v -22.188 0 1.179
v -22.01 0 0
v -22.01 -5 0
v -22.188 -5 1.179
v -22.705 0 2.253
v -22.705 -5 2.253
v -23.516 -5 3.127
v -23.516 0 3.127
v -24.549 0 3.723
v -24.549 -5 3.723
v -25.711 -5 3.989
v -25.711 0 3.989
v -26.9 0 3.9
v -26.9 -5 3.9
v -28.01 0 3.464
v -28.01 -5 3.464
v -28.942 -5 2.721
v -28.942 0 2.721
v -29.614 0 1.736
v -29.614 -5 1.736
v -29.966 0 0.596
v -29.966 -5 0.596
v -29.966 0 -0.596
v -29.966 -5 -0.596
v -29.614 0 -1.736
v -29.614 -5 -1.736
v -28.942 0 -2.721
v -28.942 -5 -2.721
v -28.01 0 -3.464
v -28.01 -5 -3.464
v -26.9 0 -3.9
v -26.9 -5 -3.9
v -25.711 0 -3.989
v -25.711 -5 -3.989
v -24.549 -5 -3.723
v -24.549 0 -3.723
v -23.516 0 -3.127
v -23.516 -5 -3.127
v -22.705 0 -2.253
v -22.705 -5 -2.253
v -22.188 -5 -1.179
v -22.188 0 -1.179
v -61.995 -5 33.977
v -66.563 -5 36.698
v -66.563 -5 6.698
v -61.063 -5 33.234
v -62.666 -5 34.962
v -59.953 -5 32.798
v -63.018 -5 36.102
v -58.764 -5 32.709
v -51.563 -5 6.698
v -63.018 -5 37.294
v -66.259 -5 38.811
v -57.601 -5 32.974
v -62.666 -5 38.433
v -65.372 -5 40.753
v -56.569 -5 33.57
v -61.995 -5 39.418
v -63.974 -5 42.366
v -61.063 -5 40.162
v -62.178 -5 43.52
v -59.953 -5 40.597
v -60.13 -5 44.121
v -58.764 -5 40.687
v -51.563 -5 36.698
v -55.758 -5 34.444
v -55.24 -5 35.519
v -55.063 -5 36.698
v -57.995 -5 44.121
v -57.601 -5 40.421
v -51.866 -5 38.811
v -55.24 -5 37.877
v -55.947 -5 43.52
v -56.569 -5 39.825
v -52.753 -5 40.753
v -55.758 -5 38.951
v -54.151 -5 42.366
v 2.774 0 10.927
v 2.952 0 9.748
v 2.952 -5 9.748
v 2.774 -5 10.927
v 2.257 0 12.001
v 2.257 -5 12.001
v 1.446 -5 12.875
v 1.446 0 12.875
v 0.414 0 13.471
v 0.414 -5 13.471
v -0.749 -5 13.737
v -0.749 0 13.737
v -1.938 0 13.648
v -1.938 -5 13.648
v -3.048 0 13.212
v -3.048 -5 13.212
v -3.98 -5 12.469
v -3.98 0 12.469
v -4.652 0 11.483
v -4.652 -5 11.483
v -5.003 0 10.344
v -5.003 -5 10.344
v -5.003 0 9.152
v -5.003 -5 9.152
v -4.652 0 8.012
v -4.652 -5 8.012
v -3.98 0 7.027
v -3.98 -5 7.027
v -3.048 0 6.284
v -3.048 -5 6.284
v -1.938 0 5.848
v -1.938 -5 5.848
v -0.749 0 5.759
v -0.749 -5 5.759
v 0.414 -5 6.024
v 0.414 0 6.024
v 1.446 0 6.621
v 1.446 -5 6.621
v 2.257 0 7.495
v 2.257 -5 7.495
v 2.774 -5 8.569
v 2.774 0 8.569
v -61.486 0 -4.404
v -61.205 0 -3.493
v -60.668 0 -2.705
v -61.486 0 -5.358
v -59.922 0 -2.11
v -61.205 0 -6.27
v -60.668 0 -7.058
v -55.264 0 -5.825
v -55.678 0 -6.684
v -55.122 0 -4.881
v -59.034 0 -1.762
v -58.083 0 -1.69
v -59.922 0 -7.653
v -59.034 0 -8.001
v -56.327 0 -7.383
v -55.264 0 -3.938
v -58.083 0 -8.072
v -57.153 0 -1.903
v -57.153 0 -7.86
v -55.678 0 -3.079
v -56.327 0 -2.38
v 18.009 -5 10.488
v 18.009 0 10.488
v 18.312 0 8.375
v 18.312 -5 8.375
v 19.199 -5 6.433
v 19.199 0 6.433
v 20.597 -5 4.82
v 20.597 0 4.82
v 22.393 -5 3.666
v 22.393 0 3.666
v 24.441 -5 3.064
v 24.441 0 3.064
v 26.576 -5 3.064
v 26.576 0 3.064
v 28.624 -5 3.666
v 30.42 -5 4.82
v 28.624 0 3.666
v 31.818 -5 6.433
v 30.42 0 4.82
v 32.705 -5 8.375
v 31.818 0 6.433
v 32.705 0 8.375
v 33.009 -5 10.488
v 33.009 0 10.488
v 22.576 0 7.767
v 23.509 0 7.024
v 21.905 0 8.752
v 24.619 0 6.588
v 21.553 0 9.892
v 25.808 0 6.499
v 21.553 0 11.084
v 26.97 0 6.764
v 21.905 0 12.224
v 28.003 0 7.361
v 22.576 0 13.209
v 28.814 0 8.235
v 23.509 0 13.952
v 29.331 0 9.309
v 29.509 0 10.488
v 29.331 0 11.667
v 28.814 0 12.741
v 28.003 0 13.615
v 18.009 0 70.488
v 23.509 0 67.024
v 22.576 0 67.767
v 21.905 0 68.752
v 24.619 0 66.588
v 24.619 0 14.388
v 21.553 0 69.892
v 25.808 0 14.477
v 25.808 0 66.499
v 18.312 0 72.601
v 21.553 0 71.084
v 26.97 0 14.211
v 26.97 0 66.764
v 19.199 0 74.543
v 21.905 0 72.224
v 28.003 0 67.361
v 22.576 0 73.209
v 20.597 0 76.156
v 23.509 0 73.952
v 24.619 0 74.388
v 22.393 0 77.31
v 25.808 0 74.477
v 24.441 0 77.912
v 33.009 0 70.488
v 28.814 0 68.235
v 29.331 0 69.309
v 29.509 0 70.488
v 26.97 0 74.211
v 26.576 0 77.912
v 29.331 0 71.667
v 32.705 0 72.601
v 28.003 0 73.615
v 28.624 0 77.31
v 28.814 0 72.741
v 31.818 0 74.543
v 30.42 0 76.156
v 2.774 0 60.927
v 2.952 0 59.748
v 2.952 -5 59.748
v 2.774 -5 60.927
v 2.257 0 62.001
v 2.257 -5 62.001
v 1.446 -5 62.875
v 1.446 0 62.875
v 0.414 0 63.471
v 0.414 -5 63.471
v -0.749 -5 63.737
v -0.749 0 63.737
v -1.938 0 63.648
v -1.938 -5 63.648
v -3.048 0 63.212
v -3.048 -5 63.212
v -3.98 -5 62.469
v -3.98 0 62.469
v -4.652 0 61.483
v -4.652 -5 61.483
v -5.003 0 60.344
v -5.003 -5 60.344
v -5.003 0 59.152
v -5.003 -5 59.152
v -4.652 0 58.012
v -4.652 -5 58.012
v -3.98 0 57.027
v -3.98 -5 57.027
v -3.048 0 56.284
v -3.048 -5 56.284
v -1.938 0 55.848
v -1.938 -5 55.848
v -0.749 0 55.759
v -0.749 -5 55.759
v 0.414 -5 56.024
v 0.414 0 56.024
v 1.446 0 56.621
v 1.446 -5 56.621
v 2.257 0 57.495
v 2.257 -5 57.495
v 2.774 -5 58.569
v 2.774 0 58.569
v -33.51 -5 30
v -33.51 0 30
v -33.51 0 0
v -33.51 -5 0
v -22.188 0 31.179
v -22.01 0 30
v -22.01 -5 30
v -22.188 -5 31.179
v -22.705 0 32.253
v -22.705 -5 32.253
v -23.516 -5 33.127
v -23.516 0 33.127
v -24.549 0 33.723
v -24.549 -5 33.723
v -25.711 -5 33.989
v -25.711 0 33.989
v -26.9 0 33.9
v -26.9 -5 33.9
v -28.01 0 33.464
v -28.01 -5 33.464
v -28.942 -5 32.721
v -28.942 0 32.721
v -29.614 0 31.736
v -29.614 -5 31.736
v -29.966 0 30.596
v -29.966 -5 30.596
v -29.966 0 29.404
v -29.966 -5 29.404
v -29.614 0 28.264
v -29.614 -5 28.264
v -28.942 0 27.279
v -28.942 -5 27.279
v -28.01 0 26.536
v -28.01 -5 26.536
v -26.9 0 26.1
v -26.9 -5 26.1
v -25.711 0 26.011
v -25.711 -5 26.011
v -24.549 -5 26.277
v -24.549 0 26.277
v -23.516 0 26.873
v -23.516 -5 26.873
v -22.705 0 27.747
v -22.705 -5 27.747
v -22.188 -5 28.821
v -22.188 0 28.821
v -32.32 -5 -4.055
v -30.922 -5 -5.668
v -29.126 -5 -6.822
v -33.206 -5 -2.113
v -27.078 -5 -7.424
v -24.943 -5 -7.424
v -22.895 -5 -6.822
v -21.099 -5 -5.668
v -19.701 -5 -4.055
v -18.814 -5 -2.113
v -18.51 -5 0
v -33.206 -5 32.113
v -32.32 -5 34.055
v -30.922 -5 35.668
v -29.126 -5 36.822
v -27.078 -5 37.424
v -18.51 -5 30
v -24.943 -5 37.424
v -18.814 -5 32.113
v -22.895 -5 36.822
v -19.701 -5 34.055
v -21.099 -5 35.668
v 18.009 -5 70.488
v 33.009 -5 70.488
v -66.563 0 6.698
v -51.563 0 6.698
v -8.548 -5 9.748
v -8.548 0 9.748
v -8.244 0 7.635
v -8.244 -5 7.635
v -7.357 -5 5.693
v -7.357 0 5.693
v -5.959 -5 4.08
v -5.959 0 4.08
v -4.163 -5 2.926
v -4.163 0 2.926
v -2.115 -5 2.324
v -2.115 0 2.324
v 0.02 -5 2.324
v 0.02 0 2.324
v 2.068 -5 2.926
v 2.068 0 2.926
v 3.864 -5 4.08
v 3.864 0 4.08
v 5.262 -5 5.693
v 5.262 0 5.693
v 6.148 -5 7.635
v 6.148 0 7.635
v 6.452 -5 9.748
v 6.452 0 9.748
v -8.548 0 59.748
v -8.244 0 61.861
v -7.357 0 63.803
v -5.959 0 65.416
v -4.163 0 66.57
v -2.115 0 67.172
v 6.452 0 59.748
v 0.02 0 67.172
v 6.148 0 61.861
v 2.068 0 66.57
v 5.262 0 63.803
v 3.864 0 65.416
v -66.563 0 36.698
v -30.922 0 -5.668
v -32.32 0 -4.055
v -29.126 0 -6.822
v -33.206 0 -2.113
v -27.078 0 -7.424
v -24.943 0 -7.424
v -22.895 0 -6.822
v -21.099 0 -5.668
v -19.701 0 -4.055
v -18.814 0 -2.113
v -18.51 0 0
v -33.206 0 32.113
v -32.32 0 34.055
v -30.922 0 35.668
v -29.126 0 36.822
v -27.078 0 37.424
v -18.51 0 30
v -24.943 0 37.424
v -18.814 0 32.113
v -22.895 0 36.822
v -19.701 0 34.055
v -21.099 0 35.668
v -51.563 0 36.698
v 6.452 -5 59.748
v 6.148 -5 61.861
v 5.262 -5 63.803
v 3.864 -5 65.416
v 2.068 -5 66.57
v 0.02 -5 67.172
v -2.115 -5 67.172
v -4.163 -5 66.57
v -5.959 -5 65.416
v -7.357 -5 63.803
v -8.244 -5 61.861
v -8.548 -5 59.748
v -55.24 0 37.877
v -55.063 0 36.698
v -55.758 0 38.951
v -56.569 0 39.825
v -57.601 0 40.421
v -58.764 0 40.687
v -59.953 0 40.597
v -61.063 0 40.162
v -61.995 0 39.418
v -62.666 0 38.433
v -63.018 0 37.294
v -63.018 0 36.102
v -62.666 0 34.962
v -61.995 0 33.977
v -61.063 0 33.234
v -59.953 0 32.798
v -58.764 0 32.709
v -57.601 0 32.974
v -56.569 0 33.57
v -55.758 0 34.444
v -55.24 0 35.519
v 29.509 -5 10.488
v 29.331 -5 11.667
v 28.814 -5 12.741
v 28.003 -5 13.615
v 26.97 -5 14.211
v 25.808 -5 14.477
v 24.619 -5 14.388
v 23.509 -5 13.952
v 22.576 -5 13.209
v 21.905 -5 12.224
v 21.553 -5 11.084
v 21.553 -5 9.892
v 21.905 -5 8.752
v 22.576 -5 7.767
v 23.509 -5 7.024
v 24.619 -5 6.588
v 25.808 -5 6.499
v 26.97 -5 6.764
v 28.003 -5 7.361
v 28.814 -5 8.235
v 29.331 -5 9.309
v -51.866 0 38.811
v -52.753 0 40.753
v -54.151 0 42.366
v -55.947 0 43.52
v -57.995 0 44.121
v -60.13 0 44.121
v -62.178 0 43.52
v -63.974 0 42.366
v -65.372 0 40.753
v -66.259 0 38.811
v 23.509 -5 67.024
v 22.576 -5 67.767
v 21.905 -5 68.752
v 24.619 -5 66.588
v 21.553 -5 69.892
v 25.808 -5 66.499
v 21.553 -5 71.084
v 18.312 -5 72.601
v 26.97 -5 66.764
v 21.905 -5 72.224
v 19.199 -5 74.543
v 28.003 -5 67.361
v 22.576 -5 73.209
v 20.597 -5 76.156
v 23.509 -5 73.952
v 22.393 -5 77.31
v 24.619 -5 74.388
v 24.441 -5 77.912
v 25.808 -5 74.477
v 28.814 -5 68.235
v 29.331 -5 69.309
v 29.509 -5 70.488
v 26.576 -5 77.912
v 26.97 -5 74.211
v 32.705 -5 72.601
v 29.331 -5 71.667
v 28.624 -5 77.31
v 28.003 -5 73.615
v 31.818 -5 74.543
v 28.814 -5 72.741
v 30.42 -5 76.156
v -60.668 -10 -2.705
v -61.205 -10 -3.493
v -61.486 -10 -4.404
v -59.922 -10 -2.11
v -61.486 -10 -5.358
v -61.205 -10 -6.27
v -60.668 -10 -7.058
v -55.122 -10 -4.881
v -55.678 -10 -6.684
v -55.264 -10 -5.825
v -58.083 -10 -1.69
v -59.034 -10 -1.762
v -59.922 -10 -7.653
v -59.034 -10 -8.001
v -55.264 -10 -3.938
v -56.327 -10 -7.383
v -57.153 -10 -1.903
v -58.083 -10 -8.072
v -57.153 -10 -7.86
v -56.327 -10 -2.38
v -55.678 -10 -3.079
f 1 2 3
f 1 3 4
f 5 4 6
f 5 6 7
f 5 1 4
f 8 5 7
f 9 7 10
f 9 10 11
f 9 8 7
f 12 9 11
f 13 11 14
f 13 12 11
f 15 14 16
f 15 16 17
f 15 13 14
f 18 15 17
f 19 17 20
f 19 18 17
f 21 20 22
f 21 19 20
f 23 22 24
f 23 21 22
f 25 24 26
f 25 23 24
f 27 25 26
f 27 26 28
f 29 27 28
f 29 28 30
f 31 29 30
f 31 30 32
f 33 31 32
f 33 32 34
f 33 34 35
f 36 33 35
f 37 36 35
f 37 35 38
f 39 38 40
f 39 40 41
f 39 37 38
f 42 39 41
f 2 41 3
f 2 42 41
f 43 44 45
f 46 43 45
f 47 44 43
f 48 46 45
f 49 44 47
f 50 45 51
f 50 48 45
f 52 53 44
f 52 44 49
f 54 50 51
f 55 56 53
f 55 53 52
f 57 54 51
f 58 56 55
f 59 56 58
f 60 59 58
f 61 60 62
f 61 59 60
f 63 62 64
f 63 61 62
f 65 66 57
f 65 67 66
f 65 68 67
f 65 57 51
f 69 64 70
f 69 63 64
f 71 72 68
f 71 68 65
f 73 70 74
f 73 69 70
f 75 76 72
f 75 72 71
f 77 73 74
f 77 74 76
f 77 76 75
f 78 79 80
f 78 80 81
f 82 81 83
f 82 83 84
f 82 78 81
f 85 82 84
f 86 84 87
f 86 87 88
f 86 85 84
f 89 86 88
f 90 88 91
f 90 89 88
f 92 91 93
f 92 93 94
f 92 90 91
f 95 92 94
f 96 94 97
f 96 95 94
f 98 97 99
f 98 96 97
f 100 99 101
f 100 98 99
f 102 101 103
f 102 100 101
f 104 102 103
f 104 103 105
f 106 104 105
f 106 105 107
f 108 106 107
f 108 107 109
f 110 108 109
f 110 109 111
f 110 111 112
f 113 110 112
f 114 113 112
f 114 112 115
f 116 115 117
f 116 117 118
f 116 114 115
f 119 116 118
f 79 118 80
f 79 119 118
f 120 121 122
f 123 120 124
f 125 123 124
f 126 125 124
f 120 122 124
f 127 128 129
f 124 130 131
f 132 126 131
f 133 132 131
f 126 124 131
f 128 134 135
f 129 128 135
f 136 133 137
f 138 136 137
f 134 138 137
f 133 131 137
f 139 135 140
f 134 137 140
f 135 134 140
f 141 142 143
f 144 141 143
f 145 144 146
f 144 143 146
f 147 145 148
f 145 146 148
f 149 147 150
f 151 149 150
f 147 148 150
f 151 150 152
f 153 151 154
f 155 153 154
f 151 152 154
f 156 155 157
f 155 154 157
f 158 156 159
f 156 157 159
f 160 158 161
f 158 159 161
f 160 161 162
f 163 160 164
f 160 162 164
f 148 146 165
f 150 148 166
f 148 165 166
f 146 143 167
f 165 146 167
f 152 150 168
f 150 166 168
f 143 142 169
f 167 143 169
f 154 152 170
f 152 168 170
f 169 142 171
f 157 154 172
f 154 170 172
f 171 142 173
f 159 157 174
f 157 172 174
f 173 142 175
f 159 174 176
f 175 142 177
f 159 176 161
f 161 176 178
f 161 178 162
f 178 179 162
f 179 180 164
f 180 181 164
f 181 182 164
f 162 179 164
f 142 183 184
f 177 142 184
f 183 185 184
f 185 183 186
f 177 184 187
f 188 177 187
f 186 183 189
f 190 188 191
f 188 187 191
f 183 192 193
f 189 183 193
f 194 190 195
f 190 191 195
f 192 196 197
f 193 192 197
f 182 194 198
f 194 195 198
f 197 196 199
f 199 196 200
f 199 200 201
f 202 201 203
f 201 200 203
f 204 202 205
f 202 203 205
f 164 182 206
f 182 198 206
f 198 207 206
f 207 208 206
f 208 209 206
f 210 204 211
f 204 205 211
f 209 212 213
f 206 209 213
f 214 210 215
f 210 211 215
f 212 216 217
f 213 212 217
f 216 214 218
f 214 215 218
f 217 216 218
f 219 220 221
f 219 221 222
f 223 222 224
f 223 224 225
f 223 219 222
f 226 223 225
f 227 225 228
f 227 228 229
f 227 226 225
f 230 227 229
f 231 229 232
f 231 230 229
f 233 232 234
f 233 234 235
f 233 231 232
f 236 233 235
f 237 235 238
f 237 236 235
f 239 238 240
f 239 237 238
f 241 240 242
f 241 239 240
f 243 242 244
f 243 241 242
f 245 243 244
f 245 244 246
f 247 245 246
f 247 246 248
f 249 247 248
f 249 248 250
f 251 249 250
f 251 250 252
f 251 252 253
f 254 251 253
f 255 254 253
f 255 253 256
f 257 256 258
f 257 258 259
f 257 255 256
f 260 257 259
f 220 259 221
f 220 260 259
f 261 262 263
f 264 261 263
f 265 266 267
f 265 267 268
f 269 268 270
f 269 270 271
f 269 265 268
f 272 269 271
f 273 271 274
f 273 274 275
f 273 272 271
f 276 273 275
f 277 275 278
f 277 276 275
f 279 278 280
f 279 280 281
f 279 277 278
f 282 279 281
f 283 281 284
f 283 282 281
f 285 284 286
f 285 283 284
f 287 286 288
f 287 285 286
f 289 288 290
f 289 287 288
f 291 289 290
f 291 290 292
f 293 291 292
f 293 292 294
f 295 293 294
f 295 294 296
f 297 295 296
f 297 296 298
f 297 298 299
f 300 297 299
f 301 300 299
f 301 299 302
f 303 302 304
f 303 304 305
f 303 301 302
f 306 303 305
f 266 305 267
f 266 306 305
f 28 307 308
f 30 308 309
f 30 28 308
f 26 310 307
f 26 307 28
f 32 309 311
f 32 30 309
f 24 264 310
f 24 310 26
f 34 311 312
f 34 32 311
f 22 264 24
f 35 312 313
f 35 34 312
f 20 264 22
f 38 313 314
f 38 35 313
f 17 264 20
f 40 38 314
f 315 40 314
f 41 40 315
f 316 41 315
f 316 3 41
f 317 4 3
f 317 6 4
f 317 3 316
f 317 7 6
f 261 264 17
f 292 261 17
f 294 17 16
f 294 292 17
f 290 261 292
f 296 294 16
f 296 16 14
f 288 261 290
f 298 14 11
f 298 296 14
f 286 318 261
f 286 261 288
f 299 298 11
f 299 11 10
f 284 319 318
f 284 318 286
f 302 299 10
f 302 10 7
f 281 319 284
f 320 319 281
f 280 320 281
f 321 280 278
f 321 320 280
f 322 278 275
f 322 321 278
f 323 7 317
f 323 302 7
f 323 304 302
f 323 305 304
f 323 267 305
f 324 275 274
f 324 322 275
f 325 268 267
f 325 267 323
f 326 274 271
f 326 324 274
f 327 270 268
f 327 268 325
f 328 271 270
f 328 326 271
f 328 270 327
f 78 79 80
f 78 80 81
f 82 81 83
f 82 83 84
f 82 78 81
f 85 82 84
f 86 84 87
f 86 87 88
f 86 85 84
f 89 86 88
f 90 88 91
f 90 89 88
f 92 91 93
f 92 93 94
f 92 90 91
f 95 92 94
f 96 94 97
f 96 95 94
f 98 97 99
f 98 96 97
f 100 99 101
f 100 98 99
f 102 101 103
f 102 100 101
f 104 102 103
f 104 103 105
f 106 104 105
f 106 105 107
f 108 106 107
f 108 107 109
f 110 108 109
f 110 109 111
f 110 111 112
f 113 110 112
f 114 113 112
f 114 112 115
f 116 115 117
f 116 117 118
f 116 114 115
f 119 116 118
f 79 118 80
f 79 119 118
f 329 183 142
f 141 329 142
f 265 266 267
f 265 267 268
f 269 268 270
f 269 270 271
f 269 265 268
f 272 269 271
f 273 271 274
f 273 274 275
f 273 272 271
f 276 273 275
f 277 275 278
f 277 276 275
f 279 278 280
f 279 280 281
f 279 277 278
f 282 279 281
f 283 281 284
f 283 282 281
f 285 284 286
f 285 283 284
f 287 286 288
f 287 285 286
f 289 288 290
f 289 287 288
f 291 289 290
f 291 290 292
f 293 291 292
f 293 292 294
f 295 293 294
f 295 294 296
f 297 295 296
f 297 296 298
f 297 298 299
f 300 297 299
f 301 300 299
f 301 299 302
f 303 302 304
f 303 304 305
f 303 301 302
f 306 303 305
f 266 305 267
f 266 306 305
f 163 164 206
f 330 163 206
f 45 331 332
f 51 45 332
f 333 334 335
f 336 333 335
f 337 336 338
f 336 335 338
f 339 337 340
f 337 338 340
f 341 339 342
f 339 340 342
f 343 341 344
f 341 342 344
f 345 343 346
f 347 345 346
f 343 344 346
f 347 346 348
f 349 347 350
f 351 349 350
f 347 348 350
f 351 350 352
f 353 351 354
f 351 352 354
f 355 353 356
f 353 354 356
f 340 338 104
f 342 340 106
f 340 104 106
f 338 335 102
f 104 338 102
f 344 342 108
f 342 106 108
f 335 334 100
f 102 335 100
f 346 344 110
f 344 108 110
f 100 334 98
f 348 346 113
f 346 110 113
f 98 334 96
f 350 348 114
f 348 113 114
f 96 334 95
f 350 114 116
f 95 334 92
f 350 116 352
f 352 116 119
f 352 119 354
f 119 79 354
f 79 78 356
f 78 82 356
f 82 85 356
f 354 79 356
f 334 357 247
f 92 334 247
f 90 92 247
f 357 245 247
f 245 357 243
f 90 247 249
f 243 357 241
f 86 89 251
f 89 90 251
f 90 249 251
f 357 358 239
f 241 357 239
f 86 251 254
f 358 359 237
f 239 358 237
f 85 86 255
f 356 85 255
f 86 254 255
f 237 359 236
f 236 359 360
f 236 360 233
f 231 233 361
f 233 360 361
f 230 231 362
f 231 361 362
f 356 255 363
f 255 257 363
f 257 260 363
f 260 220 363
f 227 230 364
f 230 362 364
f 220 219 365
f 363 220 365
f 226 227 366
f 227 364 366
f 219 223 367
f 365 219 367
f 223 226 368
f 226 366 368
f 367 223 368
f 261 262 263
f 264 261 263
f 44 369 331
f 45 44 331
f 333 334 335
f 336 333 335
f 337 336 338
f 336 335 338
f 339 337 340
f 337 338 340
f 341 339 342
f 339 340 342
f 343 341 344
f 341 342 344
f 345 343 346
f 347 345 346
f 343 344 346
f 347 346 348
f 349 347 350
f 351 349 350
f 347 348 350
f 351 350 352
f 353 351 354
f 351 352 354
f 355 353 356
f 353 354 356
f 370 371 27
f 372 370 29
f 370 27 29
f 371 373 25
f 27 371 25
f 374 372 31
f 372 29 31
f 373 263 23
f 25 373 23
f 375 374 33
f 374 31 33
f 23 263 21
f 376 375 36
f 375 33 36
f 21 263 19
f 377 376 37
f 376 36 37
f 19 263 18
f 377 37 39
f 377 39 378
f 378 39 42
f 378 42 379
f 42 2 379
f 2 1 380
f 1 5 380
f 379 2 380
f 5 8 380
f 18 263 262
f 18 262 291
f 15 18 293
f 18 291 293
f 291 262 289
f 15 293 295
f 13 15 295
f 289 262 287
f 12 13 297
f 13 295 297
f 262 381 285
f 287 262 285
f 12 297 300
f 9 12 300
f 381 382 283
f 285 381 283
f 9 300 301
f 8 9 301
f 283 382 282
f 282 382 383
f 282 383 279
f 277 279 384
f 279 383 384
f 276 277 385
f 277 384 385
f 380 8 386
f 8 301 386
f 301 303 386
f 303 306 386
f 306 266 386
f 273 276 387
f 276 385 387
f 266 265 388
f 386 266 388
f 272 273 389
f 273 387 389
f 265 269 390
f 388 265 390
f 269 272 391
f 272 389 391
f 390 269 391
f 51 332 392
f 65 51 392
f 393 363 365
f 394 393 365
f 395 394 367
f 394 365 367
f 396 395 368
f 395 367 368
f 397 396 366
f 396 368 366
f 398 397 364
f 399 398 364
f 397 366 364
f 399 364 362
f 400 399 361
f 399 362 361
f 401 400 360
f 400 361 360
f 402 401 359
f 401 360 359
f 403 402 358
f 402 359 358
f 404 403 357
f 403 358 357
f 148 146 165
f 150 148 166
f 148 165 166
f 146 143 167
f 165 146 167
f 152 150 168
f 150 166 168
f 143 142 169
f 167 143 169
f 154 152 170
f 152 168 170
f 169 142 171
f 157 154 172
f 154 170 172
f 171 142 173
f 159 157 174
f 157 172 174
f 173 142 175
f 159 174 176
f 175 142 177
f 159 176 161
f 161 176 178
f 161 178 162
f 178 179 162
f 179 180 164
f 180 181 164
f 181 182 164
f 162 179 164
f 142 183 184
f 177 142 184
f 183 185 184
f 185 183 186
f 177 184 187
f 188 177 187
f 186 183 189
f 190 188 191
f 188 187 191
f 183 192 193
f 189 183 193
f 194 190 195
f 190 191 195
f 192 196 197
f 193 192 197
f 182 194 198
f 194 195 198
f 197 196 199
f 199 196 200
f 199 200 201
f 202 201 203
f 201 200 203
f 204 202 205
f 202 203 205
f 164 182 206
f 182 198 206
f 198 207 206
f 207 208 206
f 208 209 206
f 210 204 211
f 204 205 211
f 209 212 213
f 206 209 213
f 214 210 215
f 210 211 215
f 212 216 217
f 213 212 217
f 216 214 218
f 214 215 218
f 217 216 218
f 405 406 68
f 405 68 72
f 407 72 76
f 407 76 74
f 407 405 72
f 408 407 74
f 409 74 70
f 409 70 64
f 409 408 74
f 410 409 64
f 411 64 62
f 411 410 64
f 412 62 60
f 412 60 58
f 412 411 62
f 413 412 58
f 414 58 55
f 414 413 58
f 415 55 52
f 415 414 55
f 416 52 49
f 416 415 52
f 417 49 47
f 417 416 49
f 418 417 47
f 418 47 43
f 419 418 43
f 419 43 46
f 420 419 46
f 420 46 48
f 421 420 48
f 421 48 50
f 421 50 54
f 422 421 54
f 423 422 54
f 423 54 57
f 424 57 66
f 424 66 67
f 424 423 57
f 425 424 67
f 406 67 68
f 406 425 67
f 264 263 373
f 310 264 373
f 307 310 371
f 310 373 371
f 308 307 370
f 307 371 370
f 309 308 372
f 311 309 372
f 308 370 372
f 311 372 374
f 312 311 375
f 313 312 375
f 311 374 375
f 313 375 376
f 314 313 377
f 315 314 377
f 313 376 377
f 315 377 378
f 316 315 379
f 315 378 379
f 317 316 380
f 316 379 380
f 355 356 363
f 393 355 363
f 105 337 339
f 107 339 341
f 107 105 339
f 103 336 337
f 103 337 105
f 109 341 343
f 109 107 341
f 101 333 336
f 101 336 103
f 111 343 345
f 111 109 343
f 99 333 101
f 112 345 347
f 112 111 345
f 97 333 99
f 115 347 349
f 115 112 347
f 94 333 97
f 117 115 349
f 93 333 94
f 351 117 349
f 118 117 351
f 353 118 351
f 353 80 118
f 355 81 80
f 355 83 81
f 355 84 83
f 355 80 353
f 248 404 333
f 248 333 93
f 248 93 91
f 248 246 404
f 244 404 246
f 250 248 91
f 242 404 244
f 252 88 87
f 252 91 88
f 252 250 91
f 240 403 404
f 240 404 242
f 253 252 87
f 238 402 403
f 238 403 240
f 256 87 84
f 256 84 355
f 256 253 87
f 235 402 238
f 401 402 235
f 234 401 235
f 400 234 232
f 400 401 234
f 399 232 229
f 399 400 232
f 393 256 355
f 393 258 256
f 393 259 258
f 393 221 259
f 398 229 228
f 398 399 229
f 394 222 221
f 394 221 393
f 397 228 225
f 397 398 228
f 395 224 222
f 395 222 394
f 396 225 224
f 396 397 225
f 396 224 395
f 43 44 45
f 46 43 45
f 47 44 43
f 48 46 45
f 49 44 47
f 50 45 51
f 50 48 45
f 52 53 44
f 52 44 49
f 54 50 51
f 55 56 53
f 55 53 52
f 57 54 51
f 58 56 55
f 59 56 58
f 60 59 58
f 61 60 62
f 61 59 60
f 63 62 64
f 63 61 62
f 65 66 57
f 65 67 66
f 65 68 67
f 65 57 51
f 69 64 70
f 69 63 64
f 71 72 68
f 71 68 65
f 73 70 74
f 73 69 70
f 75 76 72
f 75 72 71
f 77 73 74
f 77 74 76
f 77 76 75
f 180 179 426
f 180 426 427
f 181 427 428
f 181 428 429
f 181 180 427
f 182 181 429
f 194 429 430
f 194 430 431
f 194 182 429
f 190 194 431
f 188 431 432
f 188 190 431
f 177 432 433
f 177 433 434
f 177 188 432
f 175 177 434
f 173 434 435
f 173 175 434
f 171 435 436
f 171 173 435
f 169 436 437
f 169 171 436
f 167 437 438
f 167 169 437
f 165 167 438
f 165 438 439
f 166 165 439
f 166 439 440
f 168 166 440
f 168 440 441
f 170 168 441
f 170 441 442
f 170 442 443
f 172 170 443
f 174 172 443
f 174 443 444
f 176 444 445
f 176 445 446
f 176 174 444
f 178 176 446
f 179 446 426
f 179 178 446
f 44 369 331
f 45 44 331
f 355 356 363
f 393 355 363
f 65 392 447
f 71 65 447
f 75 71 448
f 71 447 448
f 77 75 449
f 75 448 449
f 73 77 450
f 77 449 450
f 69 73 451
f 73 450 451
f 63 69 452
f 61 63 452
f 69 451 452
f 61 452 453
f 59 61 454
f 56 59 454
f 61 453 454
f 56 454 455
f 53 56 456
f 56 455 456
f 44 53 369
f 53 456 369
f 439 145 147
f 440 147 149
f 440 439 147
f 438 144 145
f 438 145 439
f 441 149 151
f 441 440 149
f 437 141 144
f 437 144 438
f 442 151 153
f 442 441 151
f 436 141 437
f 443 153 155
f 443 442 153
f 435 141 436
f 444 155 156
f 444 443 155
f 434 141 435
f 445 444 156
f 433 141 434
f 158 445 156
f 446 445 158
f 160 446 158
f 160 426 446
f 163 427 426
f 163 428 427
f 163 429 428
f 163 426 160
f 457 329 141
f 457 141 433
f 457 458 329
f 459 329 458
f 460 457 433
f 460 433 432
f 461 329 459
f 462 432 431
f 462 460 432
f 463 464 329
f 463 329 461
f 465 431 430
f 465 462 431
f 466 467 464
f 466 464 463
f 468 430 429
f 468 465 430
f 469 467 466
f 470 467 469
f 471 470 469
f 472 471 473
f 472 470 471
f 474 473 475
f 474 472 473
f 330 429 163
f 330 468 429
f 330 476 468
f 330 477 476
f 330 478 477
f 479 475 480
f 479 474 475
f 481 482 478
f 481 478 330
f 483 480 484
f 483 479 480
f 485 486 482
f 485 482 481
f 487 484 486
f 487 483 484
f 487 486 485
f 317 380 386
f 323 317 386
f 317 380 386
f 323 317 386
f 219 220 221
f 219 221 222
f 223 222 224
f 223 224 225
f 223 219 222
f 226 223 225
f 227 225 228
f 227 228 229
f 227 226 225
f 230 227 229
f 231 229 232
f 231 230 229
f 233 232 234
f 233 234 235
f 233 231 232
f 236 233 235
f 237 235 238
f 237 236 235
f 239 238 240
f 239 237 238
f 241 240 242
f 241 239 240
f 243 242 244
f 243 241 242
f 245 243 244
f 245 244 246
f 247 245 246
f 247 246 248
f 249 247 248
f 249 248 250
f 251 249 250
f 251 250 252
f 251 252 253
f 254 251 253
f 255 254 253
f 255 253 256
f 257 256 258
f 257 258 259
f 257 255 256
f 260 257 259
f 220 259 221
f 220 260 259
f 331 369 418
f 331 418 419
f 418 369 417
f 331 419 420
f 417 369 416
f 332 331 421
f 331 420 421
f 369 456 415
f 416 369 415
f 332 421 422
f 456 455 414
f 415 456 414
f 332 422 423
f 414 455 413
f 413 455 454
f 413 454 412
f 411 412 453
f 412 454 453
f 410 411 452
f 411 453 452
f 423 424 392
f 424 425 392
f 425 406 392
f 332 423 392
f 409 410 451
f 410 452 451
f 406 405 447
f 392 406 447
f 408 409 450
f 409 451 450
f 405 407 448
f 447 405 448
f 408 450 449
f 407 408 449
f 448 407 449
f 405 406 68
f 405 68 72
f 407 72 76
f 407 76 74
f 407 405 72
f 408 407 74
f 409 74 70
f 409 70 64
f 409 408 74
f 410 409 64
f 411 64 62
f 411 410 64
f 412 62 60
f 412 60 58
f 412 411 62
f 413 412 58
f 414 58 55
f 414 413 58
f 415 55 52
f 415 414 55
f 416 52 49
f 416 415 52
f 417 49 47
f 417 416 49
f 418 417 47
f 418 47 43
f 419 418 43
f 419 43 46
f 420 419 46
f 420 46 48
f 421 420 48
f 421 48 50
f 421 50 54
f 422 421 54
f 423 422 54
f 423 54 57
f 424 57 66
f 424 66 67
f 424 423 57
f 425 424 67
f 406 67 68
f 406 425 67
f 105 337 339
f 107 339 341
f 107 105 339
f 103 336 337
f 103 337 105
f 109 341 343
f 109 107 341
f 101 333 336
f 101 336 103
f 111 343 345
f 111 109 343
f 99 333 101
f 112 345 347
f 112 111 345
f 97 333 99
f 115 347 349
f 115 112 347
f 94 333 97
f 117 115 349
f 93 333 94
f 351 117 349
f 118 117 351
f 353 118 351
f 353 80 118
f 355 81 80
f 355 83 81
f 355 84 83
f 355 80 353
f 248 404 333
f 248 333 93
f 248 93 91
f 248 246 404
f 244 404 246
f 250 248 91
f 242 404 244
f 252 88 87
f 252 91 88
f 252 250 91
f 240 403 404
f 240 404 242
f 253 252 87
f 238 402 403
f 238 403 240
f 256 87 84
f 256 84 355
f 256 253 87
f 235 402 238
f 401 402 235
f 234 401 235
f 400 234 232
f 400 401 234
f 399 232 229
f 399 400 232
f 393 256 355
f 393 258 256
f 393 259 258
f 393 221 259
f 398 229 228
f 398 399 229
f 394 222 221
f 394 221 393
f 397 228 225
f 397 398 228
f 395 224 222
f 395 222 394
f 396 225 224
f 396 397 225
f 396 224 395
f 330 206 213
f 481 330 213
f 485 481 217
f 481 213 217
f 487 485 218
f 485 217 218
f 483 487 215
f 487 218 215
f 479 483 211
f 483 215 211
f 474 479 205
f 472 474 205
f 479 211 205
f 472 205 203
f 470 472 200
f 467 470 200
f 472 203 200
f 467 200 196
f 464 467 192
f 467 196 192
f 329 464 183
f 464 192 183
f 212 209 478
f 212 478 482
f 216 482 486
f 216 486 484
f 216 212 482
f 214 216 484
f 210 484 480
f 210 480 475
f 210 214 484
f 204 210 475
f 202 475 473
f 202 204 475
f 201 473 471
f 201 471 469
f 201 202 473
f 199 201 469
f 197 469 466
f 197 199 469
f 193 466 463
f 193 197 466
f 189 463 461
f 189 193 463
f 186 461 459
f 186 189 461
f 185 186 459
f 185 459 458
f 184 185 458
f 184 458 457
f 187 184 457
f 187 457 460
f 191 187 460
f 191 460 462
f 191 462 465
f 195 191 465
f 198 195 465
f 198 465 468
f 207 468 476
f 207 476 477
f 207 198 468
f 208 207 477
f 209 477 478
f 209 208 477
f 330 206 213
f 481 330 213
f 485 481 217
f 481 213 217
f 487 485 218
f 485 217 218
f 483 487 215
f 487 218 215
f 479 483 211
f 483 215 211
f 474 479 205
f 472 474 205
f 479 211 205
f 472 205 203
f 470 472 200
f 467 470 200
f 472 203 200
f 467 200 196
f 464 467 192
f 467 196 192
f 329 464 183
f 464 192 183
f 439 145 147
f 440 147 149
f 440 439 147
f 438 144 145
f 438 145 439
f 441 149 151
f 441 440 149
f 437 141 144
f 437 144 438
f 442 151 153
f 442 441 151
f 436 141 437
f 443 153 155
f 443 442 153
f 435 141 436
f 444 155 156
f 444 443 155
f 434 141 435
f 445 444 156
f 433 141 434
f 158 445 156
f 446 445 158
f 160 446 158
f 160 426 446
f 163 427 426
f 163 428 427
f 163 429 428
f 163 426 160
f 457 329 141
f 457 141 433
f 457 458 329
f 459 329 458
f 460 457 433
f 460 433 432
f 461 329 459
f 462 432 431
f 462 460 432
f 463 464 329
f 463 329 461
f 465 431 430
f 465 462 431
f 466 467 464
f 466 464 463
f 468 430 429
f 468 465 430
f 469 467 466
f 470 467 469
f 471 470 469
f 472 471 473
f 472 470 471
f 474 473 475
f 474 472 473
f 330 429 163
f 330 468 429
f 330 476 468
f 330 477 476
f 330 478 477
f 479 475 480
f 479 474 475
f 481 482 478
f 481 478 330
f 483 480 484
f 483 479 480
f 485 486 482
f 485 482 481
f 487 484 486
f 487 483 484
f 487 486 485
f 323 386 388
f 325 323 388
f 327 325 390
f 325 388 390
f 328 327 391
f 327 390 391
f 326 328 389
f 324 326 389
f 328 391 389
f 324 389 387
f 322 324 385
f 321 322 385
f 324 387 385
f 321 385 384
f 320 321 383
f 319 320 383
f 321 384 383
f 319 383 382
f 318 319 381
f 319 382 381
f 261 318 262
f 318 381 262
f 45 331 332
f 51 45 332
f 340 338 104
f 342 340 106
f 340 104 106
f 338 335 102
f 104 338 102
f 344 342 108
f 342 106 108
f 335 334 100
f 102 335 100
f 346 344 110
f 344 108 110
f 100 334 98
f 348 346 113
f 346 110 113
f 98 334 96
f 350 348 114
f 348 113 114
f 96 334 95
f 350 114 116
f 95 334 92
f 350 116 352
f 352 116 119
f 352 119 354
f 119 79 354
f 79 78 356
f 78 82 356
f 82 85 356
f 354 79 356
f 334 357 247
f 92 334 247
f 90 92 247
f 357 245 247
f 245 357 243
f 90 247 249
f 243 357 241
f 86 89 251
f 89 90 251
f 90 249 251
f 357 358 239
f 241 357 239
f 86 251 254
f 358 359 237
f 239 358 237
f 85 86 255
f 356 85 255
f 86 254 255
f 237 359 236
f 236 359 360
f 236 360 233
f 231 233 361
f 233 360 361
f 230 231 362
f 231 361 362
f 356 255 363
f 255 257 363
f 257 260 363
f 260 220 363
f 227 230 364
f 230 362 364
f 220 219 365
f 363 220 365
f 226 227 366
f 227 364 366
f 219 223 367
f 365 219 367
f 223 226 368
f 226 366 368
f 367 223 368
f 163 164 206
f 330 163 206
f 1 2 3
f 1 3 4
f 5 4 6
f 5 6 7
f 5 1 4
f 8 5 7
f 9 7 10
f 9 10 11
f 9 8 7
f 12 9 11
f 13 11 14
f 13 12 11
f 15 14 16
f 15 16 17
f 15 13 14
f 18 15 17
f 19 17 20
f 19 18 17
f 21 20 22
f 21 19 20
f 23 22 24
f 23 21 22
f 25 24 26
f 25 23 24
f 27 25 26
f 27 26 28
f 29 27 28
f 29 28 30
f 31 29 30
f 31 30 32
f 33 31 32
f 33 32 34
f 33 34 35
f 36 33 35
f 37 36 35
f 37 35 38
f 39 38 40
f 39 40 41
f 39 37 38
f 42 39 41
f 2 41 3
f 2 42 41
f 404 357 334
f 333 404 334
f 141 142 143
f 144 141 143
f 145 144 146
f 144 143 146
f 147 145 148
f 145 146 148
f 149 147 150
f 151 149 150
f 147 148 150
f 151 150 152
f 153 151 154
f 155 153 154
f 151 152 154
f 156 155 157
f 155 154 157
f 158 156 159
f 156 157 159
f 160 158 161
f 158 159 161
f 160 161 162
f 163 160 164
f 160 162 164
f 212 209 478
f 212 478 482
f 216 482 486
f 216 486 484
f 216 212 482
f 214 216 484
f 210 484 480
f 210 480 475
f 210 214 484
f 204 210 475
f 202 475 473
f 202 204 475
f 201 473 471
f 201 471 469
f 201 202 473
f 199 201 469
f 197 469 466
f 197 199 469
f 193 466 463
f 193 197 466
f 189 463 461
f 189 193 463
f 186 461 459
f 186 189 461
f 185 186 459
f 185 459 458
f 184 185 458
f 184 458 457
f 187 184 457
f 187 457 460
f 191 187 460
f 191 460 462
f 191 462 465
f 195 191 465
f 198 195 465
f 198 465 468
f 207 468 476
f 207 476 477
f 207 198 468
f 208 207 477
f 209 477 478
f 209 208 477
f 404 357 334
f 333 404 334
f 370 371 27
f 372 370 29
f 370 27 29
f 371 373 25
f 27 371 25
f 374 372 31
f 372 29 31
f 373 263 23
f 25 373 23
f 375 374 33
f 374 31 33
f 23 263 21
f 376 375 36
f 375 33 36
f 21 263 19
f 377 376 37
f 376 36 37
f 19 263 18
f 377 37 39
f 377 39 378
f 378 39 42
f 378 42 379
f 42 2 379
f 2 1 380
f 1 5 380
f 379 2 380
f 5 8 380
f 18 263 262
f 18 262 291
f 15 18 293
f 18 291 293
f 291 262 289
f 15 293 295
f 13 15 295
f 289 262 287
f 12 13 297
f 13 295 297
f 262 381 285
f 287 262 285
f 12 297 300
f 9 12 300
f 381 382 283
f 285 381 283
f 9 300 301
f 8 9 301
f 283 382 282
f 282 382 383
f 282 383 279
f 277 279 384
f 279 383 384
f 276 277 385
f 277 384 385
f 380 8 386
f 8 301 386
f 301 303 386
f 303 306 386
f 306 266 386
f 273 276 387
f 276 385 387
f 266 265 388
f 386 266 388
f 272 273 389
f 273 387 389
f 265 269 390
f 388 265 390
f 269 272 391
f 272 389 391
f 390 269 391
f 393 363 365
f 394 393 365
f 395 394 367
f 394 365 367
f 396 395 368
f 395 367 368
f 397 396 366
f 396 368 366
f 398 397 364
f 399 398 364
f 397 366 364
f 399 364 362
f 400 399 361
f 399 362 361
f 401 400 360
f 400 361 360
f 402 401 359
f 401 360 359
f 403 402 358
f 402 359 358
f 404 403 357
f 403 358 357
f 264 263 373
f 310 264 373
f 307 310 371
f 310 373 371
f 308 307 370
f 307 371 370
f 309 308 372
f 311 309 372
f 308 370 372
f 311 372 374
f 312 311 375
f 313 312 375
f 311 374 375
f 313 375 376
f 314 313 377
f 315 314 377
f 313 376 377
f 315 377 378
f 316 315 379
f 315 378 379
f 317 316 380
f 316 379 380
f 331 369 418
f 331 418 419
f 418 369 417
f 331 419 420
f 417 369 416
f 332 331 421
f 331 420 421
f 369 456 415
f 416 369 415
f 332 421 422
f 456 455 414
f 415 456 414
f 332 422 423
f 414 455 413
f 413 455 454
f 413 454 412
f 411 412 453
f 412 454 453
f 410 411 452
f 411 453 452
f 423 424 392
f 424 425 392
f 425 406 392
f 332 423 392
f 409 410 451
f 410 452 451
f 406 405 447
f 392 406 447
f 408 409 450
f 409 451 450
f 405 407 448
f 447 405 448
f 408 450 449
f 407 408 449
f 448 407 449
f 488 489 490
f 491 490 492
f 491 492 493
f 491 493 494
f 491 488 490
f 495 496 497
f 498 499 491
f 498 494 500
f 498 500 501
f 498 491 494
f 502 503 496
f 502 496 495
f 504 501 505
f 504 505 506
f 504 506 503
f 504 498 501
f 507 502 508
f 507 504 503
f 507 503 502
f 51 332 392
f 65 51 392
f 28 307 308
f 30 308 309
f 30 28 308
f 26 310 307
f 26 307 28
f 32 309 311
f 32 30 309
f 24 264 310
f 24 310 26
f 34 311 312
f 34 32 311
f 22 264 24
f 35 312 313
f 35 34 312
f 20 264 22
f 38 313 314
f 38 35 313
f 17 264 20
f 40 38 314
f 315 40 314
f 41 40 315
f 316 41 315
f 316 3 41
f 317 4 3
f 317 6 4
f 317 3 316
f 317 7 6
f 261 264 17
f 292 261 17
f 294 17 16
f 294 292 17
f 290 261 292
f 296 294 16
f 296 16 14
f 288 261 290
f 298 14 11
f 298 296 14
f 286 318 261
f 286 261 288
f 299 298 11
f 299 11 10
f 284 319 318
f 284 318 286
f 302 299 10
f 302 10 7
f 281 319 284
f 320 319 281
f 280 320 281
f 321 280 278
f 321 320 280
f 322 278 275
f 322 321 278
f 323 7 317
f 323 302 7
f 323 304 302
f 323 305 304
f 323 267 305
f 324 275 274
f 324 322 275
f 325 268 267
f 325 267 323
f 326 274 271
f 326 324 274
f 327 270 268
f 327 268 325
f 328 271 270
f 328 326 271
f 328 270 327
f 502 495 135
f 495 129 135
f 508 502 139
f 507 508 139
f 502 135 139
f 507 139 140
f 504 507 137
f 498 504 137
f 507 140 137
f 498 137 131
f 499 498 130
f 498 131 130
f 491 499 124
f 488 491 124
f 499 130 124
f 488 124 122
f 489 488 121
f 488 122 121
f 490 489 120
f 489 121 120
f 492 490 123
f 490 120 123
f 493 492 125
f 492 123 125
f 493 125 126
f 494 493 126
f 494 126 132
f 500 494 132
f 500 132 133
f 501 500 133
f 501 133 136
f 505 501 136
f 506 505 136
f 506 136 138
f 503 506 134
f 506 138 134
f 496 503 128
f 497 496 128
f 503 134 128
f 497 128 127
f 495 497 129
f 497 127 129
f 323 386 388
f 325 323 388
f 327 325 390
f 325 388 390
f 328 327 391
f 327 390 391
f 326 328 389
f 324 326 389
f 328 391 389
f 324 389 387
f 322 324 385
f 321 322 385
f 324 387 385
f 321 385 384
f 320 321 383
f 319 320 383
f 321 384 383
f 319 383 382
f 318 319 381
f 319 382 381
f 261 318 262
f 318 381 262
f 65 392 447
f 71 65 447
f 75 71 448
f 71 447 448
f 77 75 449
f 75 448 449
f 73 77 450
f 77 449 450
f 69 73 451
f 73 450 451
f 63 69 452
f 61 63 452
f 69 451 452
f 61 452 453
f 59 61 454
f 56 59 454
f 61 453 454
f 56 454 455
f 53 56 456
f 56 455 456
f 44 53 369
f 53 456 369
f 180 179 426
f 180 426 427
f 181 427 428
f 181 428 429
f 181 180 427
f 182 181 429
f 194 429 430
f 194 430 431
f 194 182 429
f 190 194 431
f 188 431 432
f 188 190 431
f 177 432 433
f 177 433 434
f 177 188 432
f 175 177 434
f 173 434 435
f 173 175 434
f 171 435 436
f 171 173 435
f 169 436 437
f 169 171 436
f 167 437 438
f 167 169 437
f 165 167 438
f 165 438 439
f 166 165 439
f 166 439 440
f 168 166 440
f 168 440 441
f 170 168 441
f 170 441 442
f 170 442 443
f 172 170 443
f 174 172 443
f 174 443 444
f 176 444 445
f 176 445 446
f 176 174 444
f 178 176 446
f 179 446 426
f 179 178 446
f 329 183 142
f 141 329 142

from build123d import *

# Parameters (mm, degrees)
F0_R      = 4
F1_DEPTH  = 5
F0_R_2    = 3.2
F2_DEPTH  = 5
F2_FACE_R = 3.2
F3_DEPTH  = 5


with BuildPart() as f1:
    # F0 (on Front) → F1 (new body)
    with BuildSketch(Plane.XZ):
        with BuildLine():
            ThreePointArc((-51.562501, 36.697761), (-59.062501, 44.197761), (-66.562501, 36.697761))
            Line((-66.562501, 36.697761), (-66.562501, 6.697761))
            Line((-66.562501, 6.697761), (-51.562501, 6.697761))
            Line((-51.562501, 6.697761), (-51.562501, 36.697761))
        make_face()
        with Locations((-59.062501, 36.697761)):
            Circle(F0_R, mode=Mode.SUBTRACT)
        with BuildLine():
            ThreePointArc((-18.510203, 30), (-26.010203, 37.5), (-33.510203, 30))
            Line((-33.510203, 30), (-33.510203, 0))
            ThreePointArc((-33.510203, 0), (-26.010203, -7.5), (-18.510203, 0))
            Line((-18.510203, 0), (-18.510203, 30))
        make_face()
        with Locations((-26.010203, 0)):
            Circle(F0_R, mode=Mode.SUBTRACT)
        with Locations((-26.010203, 30)):
            Circle(F0_R, mode=Mode.SUBTRACT)
        with BuildLine():
            ThreePointArc((6.452152, 59.747937), (-1.047848, 67.247937), (-8.547848, 59.747937))
            Line((-8.547848, 59.747937), (-8.547848, 9.747937))
            ThreePointArc((-8.547848, 9.747937), (-1.047848, 2.247937), (6.452152, 9.747937))
            Line((6.452152, 9.747937), (6.452152, 59.747937))
        make_face()
        with Locations((-1.047848, 9.747937)):
            Circle(F0_R, mode=Mode.SUBTRACT)
        with Locations((-1.047848, 59.747937)):
            Circle(F0_R, mode=Mode.SUBTRACT)
        with BuildLine():
            ThreePointArc((33.008642, 70.487972), (25.508642, 77.987972), (18.008642, 70.487972))
            Line((18.008642, 70.487972), (18.008642, 10.487972))
            ThreePointArc((18.008642, 10.487972), (25.508642, 2.987972), (33.008642, 10.487972))
            Line((33.008642, 10.487972), (33.008642, 70.487972))
        make_face()
        with Locations((25.508642, 10.487972)):
            Circle(F0_R, mode=Mode.SUBTRACT)
        with Locations((25.508642, 70.487972)):
            Circle(F0_R, mode=Mode.SUBTRACT)
    extrude(amount=F1_DEPTH)


with BuildPart() as f2:
    # F0 (on Front) → F2 (new body)
    with BuildSketch(Plane.XZ):
        with BuildLine():
            ThreePointArc((-51.562501, 36.697761), (-59.062501, 44.197761), (-66.562501, 36.697761))
            Line((-66.562501, 36.697761), (-66.562501, 6.697761))
            Line((-66.562501, 6.697761), (-51.562501, 6.697761))
            Line((-51.562501, 6.697761), (-51.562501, 36.697761))
        make_face()
        with Locations((-59.062501, 36.697761)):
            Circle(F0_R, mode=Mode.SUBTRACT)
        with BuildLine():
            ThreePointArc((-18.510203, 30), (-26.010203, 37.5), (-33.510203, 30))
            Line((-33.510203, 30), (-33.510203, 0))
            ThreePointArc((-33.510203, 0), (-26.010203, -7.5), (-18.510203, 0))
            Line((-18.510203, 0), (-18.510203, 30))
        make_face()
        with Locations((-26.010203, 0)):
            Circle(F0_R, mode=Mode.SUBTRACT)
        with Locations((-26.010203, 30)):
            Circle(F0_R, mode=Mode.SUBTRACT)
        with BuildLine():
            ThreePointArc((6.452152, 59.747937), (-1.047848, 67.247937), (-8.547848, 59.747937))
            Line((-8.547848, 59.747937), (-8.547848, 9.747937))
            ThreePointArc((-8.547848, 9.747937), (-1.047848, 2.247937), (6.452152, 9.747937))
            Line((6.452152, 9.747937), (6.452152, 59.747937))
        make_face()
        with Locations((-1.047848, 9.747937)):
            Circle(F0_R, mode=Mode.SUBTRACT)
        with Locations((-1.047848, 59.747937)):
            Circle(F0_R, mode=Mode.SUBTRACT)
        with BuildLine():
            ThreePointArc((33.008642, 70.487972), (25.508642, 77.987972), (18.008642, 70.487972))
            Line((18.008642, 70.487972), (18.008642, 10.487972))
            ThreePointArc((18.008642, 10.487972), (25.508642, 2.987972), (33.008642, 10.487972))
            Line((33.008642, 10.487972), (33.008642, 70.487972))
        make_face()
        with Locations((25.508642, 10.487972)):
            Circle(F0_R, mode=Mode.SUBTRACT)
        with Locations((25.508642, 70.487972)):
            Circle(F0_R, mode=Mode.SUBTRACT)
        with Locations((-58.322046, -4.881362)):
            Circle(F0_R_2)
    extrude(amount=F2_DEPTH)

    # F2_face (on face) → F3 (join)
    with BuildSketch(Plane(origin=(-58.322046, -5, -4.881362), x_dir=(1, 0, 0), z_dir=(0, -1, 0))):
        Circle(F2_FACE_R)
    extrude(amount=F3_DEPTH)


solid = Compound([f1.part, f2.part])
